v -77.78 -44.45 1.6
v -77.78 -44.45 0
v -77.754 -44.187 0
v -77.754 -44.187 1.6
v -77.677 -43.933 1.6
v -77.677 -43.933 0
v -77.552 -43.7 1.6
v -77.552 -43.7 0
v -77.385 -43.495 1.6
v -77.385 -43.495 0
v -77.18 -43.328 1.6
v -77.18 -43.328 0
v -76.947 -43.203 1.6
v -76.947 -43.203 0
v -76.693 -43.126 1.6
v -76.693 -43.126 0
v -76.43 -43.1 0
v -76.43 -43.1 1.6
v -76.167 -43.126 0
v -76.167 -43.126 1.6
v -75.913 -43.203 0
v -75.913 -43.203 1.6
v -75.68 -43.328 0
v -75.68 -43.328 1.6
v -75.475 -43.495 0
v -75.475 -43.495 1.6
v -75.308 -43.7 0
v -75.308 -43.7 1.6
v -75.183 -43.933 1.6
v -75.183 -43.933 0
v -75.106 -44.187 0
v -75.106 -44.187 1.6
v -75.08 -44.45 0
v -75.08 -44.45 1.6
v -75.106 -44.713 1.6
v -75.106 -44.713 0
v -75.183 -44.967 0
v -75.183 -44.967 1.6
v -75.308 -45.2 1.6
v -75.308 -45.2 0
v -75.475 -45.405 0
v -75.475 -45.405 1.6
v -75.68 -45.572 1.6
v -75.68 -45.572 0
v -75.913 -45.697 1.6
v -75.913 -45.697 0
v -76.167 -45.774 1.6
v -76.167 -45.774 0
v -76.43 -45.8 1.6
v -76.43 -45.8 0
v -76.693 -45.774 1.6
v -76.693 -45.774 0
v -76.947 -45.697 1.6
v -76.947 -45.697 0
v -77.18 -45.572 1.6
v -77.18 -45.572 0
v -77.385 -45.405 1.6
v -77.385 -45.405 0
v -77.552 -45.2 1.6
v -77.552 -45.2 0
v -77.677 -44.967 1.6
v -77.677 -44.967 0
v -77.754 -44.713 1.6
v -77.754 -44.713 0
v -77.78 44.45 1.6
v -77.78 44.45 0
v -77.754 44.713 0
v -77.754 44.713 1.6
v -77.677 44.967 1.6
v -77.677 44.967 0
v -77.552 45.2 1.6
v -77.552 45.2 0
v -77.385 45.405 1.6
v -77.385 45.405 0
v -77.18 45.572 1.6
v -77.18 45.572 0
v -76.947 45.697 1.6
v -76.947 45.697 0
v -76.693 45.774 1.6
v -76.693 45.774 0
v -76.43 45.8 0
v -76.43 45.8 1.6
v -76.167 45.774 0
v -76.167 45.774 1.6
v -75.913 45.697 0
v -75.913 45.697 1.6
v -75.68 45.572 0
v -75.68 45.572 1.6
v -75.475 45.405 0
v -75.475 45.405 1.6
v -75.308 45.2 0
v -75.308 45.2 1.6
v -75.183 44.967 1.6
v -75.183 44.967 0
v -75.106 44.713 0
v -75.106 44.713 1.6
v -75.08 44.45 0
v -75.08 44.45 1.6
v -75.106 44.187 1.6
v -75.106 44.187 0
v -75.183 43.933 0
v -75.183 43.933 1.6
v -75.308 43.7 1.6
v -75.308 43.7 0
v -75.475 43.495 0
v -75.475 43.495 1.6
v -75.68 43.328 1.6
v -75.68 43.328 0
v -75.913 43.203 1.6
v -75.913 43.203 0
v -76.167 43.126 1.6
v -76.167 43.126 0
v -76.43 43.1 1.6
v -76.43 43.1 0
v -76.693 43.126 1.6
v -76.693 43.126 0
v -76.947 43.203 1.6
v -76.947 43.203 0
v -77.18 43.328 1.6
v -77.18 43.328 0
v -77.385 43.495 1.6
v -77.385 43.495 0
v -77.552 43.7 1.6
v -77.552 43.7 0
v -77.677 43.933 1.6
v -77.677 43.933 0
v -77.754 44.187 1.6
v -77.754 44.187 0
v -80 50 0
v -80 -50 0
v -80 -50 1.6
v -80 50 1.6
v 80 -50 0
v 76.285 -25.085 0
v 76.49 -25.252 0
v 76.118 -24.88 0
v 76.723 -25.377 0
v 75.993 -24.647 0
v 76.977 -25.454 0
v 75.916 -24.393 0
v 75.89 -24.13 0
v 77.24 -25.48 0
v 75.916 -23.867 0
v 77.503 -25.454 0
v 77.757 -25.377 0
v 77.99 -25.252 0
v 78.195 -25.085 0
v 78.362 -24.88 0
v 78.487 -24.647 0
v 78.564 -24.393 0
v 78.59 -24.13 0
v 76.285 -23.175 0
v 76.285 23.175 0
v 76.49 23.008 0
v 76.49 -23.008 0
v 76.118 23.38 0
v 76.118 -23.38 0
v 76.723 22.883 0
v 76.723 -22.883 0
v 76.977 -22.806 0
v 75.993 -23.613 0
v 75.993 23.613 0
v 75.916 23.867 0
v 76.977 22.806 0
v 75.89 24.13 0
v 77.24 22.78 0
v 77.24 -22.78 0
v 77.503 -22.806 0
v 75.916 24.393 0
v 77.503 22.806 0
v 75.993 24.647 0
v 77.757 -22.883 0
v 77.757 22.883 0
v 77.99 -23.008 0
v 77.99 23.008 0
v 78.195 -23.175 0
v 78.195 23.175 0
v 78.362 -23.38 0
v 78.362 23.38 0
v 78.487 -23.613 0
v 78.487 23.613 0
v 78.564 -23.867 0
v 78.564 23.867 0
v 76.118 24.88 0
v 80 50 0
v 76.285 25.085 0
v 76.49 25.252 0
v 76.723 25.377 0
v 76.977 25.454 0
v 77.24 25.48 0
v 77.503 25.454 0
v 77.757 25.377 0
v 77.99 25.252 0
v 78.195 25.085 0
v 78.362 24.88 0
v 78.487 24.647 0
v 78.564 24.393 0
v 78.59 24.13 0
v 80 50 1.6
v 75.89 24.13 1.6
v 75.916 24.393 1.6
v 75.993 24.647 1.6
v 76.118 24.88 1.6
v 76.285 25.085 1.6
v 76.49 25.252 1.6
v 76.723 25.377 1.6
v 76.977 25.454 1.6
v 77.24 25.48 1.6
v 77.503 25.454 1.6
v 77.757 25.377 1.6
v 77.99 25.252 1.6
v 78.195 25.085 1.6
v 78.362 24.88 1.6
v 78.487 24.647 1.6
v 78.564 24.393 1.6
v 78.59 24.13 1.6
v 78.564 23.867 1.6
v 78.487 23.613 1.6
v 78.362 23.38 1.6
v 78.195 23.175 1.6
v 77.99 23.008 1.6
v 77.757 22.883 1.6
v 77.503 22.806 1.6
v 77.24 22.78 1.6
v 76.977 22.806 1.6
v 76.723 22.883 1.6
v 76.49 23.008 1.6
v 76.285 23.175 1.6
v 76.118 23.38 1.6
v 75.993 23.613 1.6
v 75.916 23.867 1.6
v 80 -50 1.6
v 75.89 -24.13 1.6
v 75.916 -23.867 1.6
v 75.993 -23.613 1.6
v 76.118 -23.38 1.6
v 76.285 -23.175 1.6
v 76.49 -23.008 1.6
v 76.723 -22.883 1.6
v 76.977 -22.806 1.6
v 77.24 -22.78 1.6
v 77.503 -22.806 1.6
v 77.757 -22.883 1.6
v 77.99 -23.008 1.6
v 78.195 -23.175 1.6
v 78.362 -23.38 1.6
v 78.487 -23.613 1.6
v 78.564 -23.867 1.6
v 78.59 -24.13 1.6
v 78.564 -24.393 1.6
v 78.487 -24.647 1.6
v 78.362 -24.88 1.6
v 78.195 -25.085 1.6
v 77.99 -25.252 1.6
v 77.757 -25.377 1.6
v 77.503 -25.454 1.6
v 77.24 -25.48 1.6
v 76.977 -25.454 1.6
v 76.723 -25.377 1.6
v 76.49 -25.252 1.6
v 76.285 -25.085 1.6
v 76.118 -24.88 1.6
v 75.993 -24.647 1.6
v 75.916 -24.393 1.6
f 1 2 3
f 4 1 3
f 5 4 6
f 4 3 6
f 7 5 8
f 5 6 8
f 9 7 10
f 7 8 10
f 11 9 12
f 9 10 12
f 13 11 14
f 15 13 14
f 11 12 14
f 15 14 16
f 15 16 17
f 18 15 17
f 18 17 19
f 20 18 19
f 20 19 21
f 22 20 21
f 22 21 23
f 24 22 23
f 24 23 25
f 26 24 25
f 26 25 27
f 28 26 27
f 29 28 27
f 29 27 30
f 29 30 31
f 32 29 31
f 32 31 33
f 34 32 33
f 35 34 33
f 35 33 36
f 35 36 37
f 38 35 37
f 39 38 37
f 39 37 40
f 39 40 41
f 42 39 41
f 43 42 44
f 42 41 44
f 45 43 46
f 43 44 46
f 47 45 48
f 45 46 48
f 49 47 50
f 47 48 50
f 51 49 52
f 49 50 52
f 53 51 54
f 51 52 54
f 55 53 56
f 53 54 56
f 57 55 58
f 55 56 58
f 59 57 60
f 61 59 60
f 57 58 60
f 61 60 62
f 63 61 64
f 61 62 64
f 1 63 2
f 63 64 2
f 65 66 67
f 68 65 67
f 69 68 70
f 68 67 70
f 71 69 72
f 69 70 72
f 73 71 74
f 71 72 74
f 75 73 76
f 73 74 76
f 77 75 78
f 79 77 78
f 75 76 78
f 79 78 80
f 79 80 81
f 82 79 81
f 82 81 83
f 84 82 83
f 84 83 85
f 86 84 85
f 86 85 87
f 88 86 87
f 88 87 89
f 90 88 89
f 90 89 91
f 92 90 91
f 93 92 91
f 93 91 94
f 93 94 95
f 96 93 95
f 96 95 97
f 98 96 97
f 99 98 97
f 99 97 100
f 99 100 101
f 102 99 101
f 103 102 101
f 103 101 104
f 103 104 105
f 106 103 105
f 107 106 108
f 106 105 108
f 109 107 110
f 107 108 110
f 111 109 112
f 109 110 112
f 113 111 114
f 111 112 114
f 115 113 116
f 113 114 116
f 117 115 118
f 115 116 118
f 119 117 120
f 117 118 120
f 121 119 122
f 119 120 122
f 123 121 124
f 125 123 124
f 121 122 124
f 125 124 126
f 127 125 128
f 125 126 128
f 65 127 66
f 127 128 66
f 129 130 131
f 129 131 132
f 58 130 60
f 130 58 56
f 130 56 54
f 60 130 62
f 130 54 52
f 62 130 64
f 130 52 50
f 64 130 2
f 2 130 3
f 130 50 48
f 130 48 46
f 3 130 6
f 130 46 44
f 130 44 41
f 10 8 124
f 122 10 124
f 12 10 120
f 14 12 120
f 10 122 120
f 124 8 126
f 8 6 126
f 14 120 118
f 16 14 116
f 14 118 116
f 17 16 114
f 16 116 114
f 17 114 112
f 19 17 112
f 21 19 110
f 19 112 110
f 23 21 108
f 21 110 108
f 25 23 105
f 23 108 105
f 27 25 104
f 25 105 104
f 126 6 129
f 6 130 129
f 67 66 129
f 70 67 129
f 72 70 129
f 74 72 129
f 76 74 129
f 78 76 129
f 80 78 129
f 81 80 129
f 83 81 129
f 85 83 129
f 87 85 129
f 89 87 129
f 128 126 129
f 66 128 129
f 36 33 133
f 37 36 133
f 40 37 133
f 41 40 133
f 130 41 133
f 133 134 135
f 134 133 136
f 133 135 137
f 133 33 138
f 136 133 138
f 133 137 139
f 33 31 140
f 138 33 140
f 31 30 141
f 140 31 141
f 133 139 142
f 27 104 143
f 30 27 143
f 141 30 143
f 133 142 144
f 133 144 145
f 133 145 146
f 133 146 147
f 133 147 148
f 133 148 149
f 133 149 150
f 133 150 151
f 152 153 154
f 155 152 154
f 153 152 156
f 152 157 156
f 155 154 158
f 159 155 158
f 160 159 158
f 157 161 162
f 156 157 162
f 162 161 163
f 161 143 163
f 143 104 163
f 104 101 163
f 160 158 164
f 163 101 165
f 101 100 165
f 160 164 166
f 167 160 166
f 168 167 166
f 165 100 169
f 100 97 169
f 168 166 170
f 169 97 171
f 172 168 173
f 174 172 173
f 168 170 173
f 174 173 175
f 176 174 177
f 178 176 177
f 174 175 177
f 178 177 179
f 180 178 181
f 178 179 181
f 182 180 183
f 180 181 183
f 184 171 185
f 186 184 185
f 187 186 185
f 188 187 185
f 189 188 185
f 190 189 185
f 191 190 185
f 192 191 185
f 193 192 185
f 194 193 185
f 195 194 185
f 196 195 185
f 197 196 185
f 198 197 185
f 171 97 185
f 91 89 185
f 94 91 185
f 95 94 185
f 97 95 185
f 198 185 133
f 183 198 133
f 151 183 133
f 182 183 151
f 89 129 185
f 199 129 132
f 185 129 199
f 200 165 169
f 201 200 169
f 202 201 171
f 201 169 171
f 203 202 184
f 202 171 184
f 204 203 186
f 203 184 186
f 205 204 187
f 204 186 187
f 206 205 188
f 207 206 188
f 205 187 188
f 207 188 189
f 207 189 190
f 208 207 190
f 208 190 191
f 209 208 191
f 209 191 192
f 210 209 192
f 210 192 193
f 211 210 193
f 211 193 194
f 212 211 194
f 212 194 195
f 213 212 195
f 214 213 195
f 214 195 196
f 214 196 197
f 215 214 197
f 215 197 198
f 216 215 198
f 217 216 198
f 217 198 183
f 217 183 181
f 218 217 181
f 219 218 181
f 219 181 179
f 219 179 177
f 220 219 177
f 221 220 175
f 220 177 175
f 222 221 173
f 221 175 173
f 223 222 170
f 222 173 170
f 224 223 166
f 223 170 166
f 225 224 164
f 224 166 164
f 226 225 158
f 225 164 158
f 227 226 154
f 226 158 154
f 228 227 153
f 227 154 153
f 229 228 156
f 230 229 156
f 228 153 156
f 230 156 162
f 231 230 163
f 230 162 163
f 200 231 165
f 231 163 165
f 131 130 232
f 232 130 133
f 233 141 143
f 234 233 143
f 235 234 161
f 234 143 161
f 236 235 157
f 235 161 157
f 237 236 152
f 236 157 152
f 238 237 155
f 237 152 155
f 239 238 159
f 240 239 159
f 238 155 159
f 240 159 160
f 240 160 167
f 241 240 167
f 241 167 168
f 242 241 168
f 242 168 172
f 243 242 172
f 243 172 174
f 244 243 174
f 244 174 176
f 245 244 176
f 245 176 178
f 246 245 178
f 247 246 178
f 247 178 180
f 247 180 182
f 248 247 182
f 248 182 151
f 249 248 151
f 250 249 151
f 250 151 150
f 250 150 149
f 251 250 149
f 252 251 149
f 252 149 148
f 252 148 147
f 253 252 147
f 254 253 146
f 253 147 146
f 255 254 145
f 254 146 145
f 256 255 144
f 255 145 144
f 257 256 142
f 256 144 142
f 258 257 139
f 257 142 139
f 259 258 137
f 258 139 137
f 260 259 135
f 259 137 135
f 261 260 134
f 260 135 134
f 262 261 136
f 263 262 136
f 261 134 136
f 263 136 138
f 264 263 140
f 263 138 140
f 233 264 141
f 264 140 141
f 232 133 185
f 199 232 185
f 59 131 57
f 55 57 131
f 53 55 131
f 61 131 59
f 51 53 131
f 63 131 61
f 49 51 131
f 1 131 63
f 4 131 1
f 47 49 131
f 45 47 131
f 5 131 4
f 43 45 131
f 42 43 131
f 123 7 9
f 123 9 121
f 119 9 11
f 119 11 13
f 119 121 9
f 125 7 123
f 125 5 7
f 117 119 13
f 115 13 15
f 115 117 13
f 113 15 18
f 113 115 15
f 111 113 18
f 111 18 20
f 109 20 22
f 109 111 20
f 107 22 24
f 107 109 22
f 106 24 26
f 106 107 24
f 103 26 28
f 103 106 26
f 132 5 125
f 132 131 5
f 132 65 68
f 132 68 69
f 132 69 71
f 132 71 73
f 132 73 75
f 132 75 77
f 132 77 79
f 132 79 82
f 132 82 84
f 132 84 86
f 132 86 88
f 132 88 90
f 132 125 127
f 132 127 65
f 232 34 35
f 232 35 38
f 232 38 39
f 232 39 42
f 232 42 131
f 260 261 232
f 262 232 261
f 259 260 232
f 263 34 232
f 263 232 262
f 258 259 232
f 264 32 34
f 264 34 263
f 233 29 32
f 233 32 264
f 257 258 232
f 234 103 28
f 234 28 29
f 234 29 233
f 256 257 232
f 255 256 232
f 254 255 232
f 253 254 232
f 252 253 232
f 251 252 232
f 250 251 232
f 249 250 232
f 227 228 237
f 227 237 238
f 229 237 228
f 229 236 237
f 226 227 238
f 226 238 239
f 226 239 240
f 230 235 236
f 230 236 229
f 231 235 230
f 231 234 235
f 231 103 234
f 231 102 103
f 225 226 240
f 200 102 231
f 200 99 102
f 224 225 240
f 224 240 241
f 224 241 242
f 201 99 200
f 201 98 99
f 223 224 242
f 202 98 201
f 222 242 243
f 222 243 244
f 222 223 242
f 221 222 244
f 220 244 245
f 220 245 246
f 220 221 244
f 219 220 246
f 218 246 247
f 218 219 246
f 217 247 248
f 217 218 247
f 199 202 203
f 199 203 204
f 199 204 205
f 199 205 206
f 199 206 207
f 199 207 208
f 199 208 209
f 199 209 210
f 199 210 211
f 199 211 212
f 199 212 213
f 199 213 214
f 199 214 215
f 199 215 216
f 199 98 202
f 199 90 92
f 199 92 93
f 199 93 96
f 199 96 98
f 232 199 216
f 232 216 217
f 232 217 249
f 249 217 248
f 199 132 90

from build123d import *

# Parameters (mm, degrees)
ESQUISSE1_W                     = 160
ESQUISSE1_H                     = 100
BOSS_EXTRU_1_DEPTH              = 1.6
DIAM_TRE_DU_PER_AGE_2_7_2_7_1_D = 2.7
DIAM_TRE_DU_PER_AGE_2_7_2_7_2_D = 2.7


with BuildPart() as part:
    # Esquisse1 → Boss.-Extru.1 (new body)
    with BuildSketch(Plane.XY):
        Rectangle(ESQUISSE1_W, ESQUISSE1_H)
    extrude(amount=BOSS_EXTRU_1_DEPTH)

    # Diamètre du perçage Ø2.7 (2.7)1 (through all)
    with Locations(Plane.XY.offset(1.6)):
        with Locations((-76.43, 44.45), (-76.43, -44.45)):
            Hole(DIAM_TRE_DU_PER_AGE_2_7_2_7_1_D / 2)

    # Diamètre du perçage Ø2.7 (2.7)2 (through all)
    with Locations(Plane.XY.offset(1.6)):
        with Locations((77.24, 24.13), (77.24, -24.13)):
            Hole(DIAM_TRE_DU_PER_AGE_2_7_2_7_2_D / 2)


solid = part.part
